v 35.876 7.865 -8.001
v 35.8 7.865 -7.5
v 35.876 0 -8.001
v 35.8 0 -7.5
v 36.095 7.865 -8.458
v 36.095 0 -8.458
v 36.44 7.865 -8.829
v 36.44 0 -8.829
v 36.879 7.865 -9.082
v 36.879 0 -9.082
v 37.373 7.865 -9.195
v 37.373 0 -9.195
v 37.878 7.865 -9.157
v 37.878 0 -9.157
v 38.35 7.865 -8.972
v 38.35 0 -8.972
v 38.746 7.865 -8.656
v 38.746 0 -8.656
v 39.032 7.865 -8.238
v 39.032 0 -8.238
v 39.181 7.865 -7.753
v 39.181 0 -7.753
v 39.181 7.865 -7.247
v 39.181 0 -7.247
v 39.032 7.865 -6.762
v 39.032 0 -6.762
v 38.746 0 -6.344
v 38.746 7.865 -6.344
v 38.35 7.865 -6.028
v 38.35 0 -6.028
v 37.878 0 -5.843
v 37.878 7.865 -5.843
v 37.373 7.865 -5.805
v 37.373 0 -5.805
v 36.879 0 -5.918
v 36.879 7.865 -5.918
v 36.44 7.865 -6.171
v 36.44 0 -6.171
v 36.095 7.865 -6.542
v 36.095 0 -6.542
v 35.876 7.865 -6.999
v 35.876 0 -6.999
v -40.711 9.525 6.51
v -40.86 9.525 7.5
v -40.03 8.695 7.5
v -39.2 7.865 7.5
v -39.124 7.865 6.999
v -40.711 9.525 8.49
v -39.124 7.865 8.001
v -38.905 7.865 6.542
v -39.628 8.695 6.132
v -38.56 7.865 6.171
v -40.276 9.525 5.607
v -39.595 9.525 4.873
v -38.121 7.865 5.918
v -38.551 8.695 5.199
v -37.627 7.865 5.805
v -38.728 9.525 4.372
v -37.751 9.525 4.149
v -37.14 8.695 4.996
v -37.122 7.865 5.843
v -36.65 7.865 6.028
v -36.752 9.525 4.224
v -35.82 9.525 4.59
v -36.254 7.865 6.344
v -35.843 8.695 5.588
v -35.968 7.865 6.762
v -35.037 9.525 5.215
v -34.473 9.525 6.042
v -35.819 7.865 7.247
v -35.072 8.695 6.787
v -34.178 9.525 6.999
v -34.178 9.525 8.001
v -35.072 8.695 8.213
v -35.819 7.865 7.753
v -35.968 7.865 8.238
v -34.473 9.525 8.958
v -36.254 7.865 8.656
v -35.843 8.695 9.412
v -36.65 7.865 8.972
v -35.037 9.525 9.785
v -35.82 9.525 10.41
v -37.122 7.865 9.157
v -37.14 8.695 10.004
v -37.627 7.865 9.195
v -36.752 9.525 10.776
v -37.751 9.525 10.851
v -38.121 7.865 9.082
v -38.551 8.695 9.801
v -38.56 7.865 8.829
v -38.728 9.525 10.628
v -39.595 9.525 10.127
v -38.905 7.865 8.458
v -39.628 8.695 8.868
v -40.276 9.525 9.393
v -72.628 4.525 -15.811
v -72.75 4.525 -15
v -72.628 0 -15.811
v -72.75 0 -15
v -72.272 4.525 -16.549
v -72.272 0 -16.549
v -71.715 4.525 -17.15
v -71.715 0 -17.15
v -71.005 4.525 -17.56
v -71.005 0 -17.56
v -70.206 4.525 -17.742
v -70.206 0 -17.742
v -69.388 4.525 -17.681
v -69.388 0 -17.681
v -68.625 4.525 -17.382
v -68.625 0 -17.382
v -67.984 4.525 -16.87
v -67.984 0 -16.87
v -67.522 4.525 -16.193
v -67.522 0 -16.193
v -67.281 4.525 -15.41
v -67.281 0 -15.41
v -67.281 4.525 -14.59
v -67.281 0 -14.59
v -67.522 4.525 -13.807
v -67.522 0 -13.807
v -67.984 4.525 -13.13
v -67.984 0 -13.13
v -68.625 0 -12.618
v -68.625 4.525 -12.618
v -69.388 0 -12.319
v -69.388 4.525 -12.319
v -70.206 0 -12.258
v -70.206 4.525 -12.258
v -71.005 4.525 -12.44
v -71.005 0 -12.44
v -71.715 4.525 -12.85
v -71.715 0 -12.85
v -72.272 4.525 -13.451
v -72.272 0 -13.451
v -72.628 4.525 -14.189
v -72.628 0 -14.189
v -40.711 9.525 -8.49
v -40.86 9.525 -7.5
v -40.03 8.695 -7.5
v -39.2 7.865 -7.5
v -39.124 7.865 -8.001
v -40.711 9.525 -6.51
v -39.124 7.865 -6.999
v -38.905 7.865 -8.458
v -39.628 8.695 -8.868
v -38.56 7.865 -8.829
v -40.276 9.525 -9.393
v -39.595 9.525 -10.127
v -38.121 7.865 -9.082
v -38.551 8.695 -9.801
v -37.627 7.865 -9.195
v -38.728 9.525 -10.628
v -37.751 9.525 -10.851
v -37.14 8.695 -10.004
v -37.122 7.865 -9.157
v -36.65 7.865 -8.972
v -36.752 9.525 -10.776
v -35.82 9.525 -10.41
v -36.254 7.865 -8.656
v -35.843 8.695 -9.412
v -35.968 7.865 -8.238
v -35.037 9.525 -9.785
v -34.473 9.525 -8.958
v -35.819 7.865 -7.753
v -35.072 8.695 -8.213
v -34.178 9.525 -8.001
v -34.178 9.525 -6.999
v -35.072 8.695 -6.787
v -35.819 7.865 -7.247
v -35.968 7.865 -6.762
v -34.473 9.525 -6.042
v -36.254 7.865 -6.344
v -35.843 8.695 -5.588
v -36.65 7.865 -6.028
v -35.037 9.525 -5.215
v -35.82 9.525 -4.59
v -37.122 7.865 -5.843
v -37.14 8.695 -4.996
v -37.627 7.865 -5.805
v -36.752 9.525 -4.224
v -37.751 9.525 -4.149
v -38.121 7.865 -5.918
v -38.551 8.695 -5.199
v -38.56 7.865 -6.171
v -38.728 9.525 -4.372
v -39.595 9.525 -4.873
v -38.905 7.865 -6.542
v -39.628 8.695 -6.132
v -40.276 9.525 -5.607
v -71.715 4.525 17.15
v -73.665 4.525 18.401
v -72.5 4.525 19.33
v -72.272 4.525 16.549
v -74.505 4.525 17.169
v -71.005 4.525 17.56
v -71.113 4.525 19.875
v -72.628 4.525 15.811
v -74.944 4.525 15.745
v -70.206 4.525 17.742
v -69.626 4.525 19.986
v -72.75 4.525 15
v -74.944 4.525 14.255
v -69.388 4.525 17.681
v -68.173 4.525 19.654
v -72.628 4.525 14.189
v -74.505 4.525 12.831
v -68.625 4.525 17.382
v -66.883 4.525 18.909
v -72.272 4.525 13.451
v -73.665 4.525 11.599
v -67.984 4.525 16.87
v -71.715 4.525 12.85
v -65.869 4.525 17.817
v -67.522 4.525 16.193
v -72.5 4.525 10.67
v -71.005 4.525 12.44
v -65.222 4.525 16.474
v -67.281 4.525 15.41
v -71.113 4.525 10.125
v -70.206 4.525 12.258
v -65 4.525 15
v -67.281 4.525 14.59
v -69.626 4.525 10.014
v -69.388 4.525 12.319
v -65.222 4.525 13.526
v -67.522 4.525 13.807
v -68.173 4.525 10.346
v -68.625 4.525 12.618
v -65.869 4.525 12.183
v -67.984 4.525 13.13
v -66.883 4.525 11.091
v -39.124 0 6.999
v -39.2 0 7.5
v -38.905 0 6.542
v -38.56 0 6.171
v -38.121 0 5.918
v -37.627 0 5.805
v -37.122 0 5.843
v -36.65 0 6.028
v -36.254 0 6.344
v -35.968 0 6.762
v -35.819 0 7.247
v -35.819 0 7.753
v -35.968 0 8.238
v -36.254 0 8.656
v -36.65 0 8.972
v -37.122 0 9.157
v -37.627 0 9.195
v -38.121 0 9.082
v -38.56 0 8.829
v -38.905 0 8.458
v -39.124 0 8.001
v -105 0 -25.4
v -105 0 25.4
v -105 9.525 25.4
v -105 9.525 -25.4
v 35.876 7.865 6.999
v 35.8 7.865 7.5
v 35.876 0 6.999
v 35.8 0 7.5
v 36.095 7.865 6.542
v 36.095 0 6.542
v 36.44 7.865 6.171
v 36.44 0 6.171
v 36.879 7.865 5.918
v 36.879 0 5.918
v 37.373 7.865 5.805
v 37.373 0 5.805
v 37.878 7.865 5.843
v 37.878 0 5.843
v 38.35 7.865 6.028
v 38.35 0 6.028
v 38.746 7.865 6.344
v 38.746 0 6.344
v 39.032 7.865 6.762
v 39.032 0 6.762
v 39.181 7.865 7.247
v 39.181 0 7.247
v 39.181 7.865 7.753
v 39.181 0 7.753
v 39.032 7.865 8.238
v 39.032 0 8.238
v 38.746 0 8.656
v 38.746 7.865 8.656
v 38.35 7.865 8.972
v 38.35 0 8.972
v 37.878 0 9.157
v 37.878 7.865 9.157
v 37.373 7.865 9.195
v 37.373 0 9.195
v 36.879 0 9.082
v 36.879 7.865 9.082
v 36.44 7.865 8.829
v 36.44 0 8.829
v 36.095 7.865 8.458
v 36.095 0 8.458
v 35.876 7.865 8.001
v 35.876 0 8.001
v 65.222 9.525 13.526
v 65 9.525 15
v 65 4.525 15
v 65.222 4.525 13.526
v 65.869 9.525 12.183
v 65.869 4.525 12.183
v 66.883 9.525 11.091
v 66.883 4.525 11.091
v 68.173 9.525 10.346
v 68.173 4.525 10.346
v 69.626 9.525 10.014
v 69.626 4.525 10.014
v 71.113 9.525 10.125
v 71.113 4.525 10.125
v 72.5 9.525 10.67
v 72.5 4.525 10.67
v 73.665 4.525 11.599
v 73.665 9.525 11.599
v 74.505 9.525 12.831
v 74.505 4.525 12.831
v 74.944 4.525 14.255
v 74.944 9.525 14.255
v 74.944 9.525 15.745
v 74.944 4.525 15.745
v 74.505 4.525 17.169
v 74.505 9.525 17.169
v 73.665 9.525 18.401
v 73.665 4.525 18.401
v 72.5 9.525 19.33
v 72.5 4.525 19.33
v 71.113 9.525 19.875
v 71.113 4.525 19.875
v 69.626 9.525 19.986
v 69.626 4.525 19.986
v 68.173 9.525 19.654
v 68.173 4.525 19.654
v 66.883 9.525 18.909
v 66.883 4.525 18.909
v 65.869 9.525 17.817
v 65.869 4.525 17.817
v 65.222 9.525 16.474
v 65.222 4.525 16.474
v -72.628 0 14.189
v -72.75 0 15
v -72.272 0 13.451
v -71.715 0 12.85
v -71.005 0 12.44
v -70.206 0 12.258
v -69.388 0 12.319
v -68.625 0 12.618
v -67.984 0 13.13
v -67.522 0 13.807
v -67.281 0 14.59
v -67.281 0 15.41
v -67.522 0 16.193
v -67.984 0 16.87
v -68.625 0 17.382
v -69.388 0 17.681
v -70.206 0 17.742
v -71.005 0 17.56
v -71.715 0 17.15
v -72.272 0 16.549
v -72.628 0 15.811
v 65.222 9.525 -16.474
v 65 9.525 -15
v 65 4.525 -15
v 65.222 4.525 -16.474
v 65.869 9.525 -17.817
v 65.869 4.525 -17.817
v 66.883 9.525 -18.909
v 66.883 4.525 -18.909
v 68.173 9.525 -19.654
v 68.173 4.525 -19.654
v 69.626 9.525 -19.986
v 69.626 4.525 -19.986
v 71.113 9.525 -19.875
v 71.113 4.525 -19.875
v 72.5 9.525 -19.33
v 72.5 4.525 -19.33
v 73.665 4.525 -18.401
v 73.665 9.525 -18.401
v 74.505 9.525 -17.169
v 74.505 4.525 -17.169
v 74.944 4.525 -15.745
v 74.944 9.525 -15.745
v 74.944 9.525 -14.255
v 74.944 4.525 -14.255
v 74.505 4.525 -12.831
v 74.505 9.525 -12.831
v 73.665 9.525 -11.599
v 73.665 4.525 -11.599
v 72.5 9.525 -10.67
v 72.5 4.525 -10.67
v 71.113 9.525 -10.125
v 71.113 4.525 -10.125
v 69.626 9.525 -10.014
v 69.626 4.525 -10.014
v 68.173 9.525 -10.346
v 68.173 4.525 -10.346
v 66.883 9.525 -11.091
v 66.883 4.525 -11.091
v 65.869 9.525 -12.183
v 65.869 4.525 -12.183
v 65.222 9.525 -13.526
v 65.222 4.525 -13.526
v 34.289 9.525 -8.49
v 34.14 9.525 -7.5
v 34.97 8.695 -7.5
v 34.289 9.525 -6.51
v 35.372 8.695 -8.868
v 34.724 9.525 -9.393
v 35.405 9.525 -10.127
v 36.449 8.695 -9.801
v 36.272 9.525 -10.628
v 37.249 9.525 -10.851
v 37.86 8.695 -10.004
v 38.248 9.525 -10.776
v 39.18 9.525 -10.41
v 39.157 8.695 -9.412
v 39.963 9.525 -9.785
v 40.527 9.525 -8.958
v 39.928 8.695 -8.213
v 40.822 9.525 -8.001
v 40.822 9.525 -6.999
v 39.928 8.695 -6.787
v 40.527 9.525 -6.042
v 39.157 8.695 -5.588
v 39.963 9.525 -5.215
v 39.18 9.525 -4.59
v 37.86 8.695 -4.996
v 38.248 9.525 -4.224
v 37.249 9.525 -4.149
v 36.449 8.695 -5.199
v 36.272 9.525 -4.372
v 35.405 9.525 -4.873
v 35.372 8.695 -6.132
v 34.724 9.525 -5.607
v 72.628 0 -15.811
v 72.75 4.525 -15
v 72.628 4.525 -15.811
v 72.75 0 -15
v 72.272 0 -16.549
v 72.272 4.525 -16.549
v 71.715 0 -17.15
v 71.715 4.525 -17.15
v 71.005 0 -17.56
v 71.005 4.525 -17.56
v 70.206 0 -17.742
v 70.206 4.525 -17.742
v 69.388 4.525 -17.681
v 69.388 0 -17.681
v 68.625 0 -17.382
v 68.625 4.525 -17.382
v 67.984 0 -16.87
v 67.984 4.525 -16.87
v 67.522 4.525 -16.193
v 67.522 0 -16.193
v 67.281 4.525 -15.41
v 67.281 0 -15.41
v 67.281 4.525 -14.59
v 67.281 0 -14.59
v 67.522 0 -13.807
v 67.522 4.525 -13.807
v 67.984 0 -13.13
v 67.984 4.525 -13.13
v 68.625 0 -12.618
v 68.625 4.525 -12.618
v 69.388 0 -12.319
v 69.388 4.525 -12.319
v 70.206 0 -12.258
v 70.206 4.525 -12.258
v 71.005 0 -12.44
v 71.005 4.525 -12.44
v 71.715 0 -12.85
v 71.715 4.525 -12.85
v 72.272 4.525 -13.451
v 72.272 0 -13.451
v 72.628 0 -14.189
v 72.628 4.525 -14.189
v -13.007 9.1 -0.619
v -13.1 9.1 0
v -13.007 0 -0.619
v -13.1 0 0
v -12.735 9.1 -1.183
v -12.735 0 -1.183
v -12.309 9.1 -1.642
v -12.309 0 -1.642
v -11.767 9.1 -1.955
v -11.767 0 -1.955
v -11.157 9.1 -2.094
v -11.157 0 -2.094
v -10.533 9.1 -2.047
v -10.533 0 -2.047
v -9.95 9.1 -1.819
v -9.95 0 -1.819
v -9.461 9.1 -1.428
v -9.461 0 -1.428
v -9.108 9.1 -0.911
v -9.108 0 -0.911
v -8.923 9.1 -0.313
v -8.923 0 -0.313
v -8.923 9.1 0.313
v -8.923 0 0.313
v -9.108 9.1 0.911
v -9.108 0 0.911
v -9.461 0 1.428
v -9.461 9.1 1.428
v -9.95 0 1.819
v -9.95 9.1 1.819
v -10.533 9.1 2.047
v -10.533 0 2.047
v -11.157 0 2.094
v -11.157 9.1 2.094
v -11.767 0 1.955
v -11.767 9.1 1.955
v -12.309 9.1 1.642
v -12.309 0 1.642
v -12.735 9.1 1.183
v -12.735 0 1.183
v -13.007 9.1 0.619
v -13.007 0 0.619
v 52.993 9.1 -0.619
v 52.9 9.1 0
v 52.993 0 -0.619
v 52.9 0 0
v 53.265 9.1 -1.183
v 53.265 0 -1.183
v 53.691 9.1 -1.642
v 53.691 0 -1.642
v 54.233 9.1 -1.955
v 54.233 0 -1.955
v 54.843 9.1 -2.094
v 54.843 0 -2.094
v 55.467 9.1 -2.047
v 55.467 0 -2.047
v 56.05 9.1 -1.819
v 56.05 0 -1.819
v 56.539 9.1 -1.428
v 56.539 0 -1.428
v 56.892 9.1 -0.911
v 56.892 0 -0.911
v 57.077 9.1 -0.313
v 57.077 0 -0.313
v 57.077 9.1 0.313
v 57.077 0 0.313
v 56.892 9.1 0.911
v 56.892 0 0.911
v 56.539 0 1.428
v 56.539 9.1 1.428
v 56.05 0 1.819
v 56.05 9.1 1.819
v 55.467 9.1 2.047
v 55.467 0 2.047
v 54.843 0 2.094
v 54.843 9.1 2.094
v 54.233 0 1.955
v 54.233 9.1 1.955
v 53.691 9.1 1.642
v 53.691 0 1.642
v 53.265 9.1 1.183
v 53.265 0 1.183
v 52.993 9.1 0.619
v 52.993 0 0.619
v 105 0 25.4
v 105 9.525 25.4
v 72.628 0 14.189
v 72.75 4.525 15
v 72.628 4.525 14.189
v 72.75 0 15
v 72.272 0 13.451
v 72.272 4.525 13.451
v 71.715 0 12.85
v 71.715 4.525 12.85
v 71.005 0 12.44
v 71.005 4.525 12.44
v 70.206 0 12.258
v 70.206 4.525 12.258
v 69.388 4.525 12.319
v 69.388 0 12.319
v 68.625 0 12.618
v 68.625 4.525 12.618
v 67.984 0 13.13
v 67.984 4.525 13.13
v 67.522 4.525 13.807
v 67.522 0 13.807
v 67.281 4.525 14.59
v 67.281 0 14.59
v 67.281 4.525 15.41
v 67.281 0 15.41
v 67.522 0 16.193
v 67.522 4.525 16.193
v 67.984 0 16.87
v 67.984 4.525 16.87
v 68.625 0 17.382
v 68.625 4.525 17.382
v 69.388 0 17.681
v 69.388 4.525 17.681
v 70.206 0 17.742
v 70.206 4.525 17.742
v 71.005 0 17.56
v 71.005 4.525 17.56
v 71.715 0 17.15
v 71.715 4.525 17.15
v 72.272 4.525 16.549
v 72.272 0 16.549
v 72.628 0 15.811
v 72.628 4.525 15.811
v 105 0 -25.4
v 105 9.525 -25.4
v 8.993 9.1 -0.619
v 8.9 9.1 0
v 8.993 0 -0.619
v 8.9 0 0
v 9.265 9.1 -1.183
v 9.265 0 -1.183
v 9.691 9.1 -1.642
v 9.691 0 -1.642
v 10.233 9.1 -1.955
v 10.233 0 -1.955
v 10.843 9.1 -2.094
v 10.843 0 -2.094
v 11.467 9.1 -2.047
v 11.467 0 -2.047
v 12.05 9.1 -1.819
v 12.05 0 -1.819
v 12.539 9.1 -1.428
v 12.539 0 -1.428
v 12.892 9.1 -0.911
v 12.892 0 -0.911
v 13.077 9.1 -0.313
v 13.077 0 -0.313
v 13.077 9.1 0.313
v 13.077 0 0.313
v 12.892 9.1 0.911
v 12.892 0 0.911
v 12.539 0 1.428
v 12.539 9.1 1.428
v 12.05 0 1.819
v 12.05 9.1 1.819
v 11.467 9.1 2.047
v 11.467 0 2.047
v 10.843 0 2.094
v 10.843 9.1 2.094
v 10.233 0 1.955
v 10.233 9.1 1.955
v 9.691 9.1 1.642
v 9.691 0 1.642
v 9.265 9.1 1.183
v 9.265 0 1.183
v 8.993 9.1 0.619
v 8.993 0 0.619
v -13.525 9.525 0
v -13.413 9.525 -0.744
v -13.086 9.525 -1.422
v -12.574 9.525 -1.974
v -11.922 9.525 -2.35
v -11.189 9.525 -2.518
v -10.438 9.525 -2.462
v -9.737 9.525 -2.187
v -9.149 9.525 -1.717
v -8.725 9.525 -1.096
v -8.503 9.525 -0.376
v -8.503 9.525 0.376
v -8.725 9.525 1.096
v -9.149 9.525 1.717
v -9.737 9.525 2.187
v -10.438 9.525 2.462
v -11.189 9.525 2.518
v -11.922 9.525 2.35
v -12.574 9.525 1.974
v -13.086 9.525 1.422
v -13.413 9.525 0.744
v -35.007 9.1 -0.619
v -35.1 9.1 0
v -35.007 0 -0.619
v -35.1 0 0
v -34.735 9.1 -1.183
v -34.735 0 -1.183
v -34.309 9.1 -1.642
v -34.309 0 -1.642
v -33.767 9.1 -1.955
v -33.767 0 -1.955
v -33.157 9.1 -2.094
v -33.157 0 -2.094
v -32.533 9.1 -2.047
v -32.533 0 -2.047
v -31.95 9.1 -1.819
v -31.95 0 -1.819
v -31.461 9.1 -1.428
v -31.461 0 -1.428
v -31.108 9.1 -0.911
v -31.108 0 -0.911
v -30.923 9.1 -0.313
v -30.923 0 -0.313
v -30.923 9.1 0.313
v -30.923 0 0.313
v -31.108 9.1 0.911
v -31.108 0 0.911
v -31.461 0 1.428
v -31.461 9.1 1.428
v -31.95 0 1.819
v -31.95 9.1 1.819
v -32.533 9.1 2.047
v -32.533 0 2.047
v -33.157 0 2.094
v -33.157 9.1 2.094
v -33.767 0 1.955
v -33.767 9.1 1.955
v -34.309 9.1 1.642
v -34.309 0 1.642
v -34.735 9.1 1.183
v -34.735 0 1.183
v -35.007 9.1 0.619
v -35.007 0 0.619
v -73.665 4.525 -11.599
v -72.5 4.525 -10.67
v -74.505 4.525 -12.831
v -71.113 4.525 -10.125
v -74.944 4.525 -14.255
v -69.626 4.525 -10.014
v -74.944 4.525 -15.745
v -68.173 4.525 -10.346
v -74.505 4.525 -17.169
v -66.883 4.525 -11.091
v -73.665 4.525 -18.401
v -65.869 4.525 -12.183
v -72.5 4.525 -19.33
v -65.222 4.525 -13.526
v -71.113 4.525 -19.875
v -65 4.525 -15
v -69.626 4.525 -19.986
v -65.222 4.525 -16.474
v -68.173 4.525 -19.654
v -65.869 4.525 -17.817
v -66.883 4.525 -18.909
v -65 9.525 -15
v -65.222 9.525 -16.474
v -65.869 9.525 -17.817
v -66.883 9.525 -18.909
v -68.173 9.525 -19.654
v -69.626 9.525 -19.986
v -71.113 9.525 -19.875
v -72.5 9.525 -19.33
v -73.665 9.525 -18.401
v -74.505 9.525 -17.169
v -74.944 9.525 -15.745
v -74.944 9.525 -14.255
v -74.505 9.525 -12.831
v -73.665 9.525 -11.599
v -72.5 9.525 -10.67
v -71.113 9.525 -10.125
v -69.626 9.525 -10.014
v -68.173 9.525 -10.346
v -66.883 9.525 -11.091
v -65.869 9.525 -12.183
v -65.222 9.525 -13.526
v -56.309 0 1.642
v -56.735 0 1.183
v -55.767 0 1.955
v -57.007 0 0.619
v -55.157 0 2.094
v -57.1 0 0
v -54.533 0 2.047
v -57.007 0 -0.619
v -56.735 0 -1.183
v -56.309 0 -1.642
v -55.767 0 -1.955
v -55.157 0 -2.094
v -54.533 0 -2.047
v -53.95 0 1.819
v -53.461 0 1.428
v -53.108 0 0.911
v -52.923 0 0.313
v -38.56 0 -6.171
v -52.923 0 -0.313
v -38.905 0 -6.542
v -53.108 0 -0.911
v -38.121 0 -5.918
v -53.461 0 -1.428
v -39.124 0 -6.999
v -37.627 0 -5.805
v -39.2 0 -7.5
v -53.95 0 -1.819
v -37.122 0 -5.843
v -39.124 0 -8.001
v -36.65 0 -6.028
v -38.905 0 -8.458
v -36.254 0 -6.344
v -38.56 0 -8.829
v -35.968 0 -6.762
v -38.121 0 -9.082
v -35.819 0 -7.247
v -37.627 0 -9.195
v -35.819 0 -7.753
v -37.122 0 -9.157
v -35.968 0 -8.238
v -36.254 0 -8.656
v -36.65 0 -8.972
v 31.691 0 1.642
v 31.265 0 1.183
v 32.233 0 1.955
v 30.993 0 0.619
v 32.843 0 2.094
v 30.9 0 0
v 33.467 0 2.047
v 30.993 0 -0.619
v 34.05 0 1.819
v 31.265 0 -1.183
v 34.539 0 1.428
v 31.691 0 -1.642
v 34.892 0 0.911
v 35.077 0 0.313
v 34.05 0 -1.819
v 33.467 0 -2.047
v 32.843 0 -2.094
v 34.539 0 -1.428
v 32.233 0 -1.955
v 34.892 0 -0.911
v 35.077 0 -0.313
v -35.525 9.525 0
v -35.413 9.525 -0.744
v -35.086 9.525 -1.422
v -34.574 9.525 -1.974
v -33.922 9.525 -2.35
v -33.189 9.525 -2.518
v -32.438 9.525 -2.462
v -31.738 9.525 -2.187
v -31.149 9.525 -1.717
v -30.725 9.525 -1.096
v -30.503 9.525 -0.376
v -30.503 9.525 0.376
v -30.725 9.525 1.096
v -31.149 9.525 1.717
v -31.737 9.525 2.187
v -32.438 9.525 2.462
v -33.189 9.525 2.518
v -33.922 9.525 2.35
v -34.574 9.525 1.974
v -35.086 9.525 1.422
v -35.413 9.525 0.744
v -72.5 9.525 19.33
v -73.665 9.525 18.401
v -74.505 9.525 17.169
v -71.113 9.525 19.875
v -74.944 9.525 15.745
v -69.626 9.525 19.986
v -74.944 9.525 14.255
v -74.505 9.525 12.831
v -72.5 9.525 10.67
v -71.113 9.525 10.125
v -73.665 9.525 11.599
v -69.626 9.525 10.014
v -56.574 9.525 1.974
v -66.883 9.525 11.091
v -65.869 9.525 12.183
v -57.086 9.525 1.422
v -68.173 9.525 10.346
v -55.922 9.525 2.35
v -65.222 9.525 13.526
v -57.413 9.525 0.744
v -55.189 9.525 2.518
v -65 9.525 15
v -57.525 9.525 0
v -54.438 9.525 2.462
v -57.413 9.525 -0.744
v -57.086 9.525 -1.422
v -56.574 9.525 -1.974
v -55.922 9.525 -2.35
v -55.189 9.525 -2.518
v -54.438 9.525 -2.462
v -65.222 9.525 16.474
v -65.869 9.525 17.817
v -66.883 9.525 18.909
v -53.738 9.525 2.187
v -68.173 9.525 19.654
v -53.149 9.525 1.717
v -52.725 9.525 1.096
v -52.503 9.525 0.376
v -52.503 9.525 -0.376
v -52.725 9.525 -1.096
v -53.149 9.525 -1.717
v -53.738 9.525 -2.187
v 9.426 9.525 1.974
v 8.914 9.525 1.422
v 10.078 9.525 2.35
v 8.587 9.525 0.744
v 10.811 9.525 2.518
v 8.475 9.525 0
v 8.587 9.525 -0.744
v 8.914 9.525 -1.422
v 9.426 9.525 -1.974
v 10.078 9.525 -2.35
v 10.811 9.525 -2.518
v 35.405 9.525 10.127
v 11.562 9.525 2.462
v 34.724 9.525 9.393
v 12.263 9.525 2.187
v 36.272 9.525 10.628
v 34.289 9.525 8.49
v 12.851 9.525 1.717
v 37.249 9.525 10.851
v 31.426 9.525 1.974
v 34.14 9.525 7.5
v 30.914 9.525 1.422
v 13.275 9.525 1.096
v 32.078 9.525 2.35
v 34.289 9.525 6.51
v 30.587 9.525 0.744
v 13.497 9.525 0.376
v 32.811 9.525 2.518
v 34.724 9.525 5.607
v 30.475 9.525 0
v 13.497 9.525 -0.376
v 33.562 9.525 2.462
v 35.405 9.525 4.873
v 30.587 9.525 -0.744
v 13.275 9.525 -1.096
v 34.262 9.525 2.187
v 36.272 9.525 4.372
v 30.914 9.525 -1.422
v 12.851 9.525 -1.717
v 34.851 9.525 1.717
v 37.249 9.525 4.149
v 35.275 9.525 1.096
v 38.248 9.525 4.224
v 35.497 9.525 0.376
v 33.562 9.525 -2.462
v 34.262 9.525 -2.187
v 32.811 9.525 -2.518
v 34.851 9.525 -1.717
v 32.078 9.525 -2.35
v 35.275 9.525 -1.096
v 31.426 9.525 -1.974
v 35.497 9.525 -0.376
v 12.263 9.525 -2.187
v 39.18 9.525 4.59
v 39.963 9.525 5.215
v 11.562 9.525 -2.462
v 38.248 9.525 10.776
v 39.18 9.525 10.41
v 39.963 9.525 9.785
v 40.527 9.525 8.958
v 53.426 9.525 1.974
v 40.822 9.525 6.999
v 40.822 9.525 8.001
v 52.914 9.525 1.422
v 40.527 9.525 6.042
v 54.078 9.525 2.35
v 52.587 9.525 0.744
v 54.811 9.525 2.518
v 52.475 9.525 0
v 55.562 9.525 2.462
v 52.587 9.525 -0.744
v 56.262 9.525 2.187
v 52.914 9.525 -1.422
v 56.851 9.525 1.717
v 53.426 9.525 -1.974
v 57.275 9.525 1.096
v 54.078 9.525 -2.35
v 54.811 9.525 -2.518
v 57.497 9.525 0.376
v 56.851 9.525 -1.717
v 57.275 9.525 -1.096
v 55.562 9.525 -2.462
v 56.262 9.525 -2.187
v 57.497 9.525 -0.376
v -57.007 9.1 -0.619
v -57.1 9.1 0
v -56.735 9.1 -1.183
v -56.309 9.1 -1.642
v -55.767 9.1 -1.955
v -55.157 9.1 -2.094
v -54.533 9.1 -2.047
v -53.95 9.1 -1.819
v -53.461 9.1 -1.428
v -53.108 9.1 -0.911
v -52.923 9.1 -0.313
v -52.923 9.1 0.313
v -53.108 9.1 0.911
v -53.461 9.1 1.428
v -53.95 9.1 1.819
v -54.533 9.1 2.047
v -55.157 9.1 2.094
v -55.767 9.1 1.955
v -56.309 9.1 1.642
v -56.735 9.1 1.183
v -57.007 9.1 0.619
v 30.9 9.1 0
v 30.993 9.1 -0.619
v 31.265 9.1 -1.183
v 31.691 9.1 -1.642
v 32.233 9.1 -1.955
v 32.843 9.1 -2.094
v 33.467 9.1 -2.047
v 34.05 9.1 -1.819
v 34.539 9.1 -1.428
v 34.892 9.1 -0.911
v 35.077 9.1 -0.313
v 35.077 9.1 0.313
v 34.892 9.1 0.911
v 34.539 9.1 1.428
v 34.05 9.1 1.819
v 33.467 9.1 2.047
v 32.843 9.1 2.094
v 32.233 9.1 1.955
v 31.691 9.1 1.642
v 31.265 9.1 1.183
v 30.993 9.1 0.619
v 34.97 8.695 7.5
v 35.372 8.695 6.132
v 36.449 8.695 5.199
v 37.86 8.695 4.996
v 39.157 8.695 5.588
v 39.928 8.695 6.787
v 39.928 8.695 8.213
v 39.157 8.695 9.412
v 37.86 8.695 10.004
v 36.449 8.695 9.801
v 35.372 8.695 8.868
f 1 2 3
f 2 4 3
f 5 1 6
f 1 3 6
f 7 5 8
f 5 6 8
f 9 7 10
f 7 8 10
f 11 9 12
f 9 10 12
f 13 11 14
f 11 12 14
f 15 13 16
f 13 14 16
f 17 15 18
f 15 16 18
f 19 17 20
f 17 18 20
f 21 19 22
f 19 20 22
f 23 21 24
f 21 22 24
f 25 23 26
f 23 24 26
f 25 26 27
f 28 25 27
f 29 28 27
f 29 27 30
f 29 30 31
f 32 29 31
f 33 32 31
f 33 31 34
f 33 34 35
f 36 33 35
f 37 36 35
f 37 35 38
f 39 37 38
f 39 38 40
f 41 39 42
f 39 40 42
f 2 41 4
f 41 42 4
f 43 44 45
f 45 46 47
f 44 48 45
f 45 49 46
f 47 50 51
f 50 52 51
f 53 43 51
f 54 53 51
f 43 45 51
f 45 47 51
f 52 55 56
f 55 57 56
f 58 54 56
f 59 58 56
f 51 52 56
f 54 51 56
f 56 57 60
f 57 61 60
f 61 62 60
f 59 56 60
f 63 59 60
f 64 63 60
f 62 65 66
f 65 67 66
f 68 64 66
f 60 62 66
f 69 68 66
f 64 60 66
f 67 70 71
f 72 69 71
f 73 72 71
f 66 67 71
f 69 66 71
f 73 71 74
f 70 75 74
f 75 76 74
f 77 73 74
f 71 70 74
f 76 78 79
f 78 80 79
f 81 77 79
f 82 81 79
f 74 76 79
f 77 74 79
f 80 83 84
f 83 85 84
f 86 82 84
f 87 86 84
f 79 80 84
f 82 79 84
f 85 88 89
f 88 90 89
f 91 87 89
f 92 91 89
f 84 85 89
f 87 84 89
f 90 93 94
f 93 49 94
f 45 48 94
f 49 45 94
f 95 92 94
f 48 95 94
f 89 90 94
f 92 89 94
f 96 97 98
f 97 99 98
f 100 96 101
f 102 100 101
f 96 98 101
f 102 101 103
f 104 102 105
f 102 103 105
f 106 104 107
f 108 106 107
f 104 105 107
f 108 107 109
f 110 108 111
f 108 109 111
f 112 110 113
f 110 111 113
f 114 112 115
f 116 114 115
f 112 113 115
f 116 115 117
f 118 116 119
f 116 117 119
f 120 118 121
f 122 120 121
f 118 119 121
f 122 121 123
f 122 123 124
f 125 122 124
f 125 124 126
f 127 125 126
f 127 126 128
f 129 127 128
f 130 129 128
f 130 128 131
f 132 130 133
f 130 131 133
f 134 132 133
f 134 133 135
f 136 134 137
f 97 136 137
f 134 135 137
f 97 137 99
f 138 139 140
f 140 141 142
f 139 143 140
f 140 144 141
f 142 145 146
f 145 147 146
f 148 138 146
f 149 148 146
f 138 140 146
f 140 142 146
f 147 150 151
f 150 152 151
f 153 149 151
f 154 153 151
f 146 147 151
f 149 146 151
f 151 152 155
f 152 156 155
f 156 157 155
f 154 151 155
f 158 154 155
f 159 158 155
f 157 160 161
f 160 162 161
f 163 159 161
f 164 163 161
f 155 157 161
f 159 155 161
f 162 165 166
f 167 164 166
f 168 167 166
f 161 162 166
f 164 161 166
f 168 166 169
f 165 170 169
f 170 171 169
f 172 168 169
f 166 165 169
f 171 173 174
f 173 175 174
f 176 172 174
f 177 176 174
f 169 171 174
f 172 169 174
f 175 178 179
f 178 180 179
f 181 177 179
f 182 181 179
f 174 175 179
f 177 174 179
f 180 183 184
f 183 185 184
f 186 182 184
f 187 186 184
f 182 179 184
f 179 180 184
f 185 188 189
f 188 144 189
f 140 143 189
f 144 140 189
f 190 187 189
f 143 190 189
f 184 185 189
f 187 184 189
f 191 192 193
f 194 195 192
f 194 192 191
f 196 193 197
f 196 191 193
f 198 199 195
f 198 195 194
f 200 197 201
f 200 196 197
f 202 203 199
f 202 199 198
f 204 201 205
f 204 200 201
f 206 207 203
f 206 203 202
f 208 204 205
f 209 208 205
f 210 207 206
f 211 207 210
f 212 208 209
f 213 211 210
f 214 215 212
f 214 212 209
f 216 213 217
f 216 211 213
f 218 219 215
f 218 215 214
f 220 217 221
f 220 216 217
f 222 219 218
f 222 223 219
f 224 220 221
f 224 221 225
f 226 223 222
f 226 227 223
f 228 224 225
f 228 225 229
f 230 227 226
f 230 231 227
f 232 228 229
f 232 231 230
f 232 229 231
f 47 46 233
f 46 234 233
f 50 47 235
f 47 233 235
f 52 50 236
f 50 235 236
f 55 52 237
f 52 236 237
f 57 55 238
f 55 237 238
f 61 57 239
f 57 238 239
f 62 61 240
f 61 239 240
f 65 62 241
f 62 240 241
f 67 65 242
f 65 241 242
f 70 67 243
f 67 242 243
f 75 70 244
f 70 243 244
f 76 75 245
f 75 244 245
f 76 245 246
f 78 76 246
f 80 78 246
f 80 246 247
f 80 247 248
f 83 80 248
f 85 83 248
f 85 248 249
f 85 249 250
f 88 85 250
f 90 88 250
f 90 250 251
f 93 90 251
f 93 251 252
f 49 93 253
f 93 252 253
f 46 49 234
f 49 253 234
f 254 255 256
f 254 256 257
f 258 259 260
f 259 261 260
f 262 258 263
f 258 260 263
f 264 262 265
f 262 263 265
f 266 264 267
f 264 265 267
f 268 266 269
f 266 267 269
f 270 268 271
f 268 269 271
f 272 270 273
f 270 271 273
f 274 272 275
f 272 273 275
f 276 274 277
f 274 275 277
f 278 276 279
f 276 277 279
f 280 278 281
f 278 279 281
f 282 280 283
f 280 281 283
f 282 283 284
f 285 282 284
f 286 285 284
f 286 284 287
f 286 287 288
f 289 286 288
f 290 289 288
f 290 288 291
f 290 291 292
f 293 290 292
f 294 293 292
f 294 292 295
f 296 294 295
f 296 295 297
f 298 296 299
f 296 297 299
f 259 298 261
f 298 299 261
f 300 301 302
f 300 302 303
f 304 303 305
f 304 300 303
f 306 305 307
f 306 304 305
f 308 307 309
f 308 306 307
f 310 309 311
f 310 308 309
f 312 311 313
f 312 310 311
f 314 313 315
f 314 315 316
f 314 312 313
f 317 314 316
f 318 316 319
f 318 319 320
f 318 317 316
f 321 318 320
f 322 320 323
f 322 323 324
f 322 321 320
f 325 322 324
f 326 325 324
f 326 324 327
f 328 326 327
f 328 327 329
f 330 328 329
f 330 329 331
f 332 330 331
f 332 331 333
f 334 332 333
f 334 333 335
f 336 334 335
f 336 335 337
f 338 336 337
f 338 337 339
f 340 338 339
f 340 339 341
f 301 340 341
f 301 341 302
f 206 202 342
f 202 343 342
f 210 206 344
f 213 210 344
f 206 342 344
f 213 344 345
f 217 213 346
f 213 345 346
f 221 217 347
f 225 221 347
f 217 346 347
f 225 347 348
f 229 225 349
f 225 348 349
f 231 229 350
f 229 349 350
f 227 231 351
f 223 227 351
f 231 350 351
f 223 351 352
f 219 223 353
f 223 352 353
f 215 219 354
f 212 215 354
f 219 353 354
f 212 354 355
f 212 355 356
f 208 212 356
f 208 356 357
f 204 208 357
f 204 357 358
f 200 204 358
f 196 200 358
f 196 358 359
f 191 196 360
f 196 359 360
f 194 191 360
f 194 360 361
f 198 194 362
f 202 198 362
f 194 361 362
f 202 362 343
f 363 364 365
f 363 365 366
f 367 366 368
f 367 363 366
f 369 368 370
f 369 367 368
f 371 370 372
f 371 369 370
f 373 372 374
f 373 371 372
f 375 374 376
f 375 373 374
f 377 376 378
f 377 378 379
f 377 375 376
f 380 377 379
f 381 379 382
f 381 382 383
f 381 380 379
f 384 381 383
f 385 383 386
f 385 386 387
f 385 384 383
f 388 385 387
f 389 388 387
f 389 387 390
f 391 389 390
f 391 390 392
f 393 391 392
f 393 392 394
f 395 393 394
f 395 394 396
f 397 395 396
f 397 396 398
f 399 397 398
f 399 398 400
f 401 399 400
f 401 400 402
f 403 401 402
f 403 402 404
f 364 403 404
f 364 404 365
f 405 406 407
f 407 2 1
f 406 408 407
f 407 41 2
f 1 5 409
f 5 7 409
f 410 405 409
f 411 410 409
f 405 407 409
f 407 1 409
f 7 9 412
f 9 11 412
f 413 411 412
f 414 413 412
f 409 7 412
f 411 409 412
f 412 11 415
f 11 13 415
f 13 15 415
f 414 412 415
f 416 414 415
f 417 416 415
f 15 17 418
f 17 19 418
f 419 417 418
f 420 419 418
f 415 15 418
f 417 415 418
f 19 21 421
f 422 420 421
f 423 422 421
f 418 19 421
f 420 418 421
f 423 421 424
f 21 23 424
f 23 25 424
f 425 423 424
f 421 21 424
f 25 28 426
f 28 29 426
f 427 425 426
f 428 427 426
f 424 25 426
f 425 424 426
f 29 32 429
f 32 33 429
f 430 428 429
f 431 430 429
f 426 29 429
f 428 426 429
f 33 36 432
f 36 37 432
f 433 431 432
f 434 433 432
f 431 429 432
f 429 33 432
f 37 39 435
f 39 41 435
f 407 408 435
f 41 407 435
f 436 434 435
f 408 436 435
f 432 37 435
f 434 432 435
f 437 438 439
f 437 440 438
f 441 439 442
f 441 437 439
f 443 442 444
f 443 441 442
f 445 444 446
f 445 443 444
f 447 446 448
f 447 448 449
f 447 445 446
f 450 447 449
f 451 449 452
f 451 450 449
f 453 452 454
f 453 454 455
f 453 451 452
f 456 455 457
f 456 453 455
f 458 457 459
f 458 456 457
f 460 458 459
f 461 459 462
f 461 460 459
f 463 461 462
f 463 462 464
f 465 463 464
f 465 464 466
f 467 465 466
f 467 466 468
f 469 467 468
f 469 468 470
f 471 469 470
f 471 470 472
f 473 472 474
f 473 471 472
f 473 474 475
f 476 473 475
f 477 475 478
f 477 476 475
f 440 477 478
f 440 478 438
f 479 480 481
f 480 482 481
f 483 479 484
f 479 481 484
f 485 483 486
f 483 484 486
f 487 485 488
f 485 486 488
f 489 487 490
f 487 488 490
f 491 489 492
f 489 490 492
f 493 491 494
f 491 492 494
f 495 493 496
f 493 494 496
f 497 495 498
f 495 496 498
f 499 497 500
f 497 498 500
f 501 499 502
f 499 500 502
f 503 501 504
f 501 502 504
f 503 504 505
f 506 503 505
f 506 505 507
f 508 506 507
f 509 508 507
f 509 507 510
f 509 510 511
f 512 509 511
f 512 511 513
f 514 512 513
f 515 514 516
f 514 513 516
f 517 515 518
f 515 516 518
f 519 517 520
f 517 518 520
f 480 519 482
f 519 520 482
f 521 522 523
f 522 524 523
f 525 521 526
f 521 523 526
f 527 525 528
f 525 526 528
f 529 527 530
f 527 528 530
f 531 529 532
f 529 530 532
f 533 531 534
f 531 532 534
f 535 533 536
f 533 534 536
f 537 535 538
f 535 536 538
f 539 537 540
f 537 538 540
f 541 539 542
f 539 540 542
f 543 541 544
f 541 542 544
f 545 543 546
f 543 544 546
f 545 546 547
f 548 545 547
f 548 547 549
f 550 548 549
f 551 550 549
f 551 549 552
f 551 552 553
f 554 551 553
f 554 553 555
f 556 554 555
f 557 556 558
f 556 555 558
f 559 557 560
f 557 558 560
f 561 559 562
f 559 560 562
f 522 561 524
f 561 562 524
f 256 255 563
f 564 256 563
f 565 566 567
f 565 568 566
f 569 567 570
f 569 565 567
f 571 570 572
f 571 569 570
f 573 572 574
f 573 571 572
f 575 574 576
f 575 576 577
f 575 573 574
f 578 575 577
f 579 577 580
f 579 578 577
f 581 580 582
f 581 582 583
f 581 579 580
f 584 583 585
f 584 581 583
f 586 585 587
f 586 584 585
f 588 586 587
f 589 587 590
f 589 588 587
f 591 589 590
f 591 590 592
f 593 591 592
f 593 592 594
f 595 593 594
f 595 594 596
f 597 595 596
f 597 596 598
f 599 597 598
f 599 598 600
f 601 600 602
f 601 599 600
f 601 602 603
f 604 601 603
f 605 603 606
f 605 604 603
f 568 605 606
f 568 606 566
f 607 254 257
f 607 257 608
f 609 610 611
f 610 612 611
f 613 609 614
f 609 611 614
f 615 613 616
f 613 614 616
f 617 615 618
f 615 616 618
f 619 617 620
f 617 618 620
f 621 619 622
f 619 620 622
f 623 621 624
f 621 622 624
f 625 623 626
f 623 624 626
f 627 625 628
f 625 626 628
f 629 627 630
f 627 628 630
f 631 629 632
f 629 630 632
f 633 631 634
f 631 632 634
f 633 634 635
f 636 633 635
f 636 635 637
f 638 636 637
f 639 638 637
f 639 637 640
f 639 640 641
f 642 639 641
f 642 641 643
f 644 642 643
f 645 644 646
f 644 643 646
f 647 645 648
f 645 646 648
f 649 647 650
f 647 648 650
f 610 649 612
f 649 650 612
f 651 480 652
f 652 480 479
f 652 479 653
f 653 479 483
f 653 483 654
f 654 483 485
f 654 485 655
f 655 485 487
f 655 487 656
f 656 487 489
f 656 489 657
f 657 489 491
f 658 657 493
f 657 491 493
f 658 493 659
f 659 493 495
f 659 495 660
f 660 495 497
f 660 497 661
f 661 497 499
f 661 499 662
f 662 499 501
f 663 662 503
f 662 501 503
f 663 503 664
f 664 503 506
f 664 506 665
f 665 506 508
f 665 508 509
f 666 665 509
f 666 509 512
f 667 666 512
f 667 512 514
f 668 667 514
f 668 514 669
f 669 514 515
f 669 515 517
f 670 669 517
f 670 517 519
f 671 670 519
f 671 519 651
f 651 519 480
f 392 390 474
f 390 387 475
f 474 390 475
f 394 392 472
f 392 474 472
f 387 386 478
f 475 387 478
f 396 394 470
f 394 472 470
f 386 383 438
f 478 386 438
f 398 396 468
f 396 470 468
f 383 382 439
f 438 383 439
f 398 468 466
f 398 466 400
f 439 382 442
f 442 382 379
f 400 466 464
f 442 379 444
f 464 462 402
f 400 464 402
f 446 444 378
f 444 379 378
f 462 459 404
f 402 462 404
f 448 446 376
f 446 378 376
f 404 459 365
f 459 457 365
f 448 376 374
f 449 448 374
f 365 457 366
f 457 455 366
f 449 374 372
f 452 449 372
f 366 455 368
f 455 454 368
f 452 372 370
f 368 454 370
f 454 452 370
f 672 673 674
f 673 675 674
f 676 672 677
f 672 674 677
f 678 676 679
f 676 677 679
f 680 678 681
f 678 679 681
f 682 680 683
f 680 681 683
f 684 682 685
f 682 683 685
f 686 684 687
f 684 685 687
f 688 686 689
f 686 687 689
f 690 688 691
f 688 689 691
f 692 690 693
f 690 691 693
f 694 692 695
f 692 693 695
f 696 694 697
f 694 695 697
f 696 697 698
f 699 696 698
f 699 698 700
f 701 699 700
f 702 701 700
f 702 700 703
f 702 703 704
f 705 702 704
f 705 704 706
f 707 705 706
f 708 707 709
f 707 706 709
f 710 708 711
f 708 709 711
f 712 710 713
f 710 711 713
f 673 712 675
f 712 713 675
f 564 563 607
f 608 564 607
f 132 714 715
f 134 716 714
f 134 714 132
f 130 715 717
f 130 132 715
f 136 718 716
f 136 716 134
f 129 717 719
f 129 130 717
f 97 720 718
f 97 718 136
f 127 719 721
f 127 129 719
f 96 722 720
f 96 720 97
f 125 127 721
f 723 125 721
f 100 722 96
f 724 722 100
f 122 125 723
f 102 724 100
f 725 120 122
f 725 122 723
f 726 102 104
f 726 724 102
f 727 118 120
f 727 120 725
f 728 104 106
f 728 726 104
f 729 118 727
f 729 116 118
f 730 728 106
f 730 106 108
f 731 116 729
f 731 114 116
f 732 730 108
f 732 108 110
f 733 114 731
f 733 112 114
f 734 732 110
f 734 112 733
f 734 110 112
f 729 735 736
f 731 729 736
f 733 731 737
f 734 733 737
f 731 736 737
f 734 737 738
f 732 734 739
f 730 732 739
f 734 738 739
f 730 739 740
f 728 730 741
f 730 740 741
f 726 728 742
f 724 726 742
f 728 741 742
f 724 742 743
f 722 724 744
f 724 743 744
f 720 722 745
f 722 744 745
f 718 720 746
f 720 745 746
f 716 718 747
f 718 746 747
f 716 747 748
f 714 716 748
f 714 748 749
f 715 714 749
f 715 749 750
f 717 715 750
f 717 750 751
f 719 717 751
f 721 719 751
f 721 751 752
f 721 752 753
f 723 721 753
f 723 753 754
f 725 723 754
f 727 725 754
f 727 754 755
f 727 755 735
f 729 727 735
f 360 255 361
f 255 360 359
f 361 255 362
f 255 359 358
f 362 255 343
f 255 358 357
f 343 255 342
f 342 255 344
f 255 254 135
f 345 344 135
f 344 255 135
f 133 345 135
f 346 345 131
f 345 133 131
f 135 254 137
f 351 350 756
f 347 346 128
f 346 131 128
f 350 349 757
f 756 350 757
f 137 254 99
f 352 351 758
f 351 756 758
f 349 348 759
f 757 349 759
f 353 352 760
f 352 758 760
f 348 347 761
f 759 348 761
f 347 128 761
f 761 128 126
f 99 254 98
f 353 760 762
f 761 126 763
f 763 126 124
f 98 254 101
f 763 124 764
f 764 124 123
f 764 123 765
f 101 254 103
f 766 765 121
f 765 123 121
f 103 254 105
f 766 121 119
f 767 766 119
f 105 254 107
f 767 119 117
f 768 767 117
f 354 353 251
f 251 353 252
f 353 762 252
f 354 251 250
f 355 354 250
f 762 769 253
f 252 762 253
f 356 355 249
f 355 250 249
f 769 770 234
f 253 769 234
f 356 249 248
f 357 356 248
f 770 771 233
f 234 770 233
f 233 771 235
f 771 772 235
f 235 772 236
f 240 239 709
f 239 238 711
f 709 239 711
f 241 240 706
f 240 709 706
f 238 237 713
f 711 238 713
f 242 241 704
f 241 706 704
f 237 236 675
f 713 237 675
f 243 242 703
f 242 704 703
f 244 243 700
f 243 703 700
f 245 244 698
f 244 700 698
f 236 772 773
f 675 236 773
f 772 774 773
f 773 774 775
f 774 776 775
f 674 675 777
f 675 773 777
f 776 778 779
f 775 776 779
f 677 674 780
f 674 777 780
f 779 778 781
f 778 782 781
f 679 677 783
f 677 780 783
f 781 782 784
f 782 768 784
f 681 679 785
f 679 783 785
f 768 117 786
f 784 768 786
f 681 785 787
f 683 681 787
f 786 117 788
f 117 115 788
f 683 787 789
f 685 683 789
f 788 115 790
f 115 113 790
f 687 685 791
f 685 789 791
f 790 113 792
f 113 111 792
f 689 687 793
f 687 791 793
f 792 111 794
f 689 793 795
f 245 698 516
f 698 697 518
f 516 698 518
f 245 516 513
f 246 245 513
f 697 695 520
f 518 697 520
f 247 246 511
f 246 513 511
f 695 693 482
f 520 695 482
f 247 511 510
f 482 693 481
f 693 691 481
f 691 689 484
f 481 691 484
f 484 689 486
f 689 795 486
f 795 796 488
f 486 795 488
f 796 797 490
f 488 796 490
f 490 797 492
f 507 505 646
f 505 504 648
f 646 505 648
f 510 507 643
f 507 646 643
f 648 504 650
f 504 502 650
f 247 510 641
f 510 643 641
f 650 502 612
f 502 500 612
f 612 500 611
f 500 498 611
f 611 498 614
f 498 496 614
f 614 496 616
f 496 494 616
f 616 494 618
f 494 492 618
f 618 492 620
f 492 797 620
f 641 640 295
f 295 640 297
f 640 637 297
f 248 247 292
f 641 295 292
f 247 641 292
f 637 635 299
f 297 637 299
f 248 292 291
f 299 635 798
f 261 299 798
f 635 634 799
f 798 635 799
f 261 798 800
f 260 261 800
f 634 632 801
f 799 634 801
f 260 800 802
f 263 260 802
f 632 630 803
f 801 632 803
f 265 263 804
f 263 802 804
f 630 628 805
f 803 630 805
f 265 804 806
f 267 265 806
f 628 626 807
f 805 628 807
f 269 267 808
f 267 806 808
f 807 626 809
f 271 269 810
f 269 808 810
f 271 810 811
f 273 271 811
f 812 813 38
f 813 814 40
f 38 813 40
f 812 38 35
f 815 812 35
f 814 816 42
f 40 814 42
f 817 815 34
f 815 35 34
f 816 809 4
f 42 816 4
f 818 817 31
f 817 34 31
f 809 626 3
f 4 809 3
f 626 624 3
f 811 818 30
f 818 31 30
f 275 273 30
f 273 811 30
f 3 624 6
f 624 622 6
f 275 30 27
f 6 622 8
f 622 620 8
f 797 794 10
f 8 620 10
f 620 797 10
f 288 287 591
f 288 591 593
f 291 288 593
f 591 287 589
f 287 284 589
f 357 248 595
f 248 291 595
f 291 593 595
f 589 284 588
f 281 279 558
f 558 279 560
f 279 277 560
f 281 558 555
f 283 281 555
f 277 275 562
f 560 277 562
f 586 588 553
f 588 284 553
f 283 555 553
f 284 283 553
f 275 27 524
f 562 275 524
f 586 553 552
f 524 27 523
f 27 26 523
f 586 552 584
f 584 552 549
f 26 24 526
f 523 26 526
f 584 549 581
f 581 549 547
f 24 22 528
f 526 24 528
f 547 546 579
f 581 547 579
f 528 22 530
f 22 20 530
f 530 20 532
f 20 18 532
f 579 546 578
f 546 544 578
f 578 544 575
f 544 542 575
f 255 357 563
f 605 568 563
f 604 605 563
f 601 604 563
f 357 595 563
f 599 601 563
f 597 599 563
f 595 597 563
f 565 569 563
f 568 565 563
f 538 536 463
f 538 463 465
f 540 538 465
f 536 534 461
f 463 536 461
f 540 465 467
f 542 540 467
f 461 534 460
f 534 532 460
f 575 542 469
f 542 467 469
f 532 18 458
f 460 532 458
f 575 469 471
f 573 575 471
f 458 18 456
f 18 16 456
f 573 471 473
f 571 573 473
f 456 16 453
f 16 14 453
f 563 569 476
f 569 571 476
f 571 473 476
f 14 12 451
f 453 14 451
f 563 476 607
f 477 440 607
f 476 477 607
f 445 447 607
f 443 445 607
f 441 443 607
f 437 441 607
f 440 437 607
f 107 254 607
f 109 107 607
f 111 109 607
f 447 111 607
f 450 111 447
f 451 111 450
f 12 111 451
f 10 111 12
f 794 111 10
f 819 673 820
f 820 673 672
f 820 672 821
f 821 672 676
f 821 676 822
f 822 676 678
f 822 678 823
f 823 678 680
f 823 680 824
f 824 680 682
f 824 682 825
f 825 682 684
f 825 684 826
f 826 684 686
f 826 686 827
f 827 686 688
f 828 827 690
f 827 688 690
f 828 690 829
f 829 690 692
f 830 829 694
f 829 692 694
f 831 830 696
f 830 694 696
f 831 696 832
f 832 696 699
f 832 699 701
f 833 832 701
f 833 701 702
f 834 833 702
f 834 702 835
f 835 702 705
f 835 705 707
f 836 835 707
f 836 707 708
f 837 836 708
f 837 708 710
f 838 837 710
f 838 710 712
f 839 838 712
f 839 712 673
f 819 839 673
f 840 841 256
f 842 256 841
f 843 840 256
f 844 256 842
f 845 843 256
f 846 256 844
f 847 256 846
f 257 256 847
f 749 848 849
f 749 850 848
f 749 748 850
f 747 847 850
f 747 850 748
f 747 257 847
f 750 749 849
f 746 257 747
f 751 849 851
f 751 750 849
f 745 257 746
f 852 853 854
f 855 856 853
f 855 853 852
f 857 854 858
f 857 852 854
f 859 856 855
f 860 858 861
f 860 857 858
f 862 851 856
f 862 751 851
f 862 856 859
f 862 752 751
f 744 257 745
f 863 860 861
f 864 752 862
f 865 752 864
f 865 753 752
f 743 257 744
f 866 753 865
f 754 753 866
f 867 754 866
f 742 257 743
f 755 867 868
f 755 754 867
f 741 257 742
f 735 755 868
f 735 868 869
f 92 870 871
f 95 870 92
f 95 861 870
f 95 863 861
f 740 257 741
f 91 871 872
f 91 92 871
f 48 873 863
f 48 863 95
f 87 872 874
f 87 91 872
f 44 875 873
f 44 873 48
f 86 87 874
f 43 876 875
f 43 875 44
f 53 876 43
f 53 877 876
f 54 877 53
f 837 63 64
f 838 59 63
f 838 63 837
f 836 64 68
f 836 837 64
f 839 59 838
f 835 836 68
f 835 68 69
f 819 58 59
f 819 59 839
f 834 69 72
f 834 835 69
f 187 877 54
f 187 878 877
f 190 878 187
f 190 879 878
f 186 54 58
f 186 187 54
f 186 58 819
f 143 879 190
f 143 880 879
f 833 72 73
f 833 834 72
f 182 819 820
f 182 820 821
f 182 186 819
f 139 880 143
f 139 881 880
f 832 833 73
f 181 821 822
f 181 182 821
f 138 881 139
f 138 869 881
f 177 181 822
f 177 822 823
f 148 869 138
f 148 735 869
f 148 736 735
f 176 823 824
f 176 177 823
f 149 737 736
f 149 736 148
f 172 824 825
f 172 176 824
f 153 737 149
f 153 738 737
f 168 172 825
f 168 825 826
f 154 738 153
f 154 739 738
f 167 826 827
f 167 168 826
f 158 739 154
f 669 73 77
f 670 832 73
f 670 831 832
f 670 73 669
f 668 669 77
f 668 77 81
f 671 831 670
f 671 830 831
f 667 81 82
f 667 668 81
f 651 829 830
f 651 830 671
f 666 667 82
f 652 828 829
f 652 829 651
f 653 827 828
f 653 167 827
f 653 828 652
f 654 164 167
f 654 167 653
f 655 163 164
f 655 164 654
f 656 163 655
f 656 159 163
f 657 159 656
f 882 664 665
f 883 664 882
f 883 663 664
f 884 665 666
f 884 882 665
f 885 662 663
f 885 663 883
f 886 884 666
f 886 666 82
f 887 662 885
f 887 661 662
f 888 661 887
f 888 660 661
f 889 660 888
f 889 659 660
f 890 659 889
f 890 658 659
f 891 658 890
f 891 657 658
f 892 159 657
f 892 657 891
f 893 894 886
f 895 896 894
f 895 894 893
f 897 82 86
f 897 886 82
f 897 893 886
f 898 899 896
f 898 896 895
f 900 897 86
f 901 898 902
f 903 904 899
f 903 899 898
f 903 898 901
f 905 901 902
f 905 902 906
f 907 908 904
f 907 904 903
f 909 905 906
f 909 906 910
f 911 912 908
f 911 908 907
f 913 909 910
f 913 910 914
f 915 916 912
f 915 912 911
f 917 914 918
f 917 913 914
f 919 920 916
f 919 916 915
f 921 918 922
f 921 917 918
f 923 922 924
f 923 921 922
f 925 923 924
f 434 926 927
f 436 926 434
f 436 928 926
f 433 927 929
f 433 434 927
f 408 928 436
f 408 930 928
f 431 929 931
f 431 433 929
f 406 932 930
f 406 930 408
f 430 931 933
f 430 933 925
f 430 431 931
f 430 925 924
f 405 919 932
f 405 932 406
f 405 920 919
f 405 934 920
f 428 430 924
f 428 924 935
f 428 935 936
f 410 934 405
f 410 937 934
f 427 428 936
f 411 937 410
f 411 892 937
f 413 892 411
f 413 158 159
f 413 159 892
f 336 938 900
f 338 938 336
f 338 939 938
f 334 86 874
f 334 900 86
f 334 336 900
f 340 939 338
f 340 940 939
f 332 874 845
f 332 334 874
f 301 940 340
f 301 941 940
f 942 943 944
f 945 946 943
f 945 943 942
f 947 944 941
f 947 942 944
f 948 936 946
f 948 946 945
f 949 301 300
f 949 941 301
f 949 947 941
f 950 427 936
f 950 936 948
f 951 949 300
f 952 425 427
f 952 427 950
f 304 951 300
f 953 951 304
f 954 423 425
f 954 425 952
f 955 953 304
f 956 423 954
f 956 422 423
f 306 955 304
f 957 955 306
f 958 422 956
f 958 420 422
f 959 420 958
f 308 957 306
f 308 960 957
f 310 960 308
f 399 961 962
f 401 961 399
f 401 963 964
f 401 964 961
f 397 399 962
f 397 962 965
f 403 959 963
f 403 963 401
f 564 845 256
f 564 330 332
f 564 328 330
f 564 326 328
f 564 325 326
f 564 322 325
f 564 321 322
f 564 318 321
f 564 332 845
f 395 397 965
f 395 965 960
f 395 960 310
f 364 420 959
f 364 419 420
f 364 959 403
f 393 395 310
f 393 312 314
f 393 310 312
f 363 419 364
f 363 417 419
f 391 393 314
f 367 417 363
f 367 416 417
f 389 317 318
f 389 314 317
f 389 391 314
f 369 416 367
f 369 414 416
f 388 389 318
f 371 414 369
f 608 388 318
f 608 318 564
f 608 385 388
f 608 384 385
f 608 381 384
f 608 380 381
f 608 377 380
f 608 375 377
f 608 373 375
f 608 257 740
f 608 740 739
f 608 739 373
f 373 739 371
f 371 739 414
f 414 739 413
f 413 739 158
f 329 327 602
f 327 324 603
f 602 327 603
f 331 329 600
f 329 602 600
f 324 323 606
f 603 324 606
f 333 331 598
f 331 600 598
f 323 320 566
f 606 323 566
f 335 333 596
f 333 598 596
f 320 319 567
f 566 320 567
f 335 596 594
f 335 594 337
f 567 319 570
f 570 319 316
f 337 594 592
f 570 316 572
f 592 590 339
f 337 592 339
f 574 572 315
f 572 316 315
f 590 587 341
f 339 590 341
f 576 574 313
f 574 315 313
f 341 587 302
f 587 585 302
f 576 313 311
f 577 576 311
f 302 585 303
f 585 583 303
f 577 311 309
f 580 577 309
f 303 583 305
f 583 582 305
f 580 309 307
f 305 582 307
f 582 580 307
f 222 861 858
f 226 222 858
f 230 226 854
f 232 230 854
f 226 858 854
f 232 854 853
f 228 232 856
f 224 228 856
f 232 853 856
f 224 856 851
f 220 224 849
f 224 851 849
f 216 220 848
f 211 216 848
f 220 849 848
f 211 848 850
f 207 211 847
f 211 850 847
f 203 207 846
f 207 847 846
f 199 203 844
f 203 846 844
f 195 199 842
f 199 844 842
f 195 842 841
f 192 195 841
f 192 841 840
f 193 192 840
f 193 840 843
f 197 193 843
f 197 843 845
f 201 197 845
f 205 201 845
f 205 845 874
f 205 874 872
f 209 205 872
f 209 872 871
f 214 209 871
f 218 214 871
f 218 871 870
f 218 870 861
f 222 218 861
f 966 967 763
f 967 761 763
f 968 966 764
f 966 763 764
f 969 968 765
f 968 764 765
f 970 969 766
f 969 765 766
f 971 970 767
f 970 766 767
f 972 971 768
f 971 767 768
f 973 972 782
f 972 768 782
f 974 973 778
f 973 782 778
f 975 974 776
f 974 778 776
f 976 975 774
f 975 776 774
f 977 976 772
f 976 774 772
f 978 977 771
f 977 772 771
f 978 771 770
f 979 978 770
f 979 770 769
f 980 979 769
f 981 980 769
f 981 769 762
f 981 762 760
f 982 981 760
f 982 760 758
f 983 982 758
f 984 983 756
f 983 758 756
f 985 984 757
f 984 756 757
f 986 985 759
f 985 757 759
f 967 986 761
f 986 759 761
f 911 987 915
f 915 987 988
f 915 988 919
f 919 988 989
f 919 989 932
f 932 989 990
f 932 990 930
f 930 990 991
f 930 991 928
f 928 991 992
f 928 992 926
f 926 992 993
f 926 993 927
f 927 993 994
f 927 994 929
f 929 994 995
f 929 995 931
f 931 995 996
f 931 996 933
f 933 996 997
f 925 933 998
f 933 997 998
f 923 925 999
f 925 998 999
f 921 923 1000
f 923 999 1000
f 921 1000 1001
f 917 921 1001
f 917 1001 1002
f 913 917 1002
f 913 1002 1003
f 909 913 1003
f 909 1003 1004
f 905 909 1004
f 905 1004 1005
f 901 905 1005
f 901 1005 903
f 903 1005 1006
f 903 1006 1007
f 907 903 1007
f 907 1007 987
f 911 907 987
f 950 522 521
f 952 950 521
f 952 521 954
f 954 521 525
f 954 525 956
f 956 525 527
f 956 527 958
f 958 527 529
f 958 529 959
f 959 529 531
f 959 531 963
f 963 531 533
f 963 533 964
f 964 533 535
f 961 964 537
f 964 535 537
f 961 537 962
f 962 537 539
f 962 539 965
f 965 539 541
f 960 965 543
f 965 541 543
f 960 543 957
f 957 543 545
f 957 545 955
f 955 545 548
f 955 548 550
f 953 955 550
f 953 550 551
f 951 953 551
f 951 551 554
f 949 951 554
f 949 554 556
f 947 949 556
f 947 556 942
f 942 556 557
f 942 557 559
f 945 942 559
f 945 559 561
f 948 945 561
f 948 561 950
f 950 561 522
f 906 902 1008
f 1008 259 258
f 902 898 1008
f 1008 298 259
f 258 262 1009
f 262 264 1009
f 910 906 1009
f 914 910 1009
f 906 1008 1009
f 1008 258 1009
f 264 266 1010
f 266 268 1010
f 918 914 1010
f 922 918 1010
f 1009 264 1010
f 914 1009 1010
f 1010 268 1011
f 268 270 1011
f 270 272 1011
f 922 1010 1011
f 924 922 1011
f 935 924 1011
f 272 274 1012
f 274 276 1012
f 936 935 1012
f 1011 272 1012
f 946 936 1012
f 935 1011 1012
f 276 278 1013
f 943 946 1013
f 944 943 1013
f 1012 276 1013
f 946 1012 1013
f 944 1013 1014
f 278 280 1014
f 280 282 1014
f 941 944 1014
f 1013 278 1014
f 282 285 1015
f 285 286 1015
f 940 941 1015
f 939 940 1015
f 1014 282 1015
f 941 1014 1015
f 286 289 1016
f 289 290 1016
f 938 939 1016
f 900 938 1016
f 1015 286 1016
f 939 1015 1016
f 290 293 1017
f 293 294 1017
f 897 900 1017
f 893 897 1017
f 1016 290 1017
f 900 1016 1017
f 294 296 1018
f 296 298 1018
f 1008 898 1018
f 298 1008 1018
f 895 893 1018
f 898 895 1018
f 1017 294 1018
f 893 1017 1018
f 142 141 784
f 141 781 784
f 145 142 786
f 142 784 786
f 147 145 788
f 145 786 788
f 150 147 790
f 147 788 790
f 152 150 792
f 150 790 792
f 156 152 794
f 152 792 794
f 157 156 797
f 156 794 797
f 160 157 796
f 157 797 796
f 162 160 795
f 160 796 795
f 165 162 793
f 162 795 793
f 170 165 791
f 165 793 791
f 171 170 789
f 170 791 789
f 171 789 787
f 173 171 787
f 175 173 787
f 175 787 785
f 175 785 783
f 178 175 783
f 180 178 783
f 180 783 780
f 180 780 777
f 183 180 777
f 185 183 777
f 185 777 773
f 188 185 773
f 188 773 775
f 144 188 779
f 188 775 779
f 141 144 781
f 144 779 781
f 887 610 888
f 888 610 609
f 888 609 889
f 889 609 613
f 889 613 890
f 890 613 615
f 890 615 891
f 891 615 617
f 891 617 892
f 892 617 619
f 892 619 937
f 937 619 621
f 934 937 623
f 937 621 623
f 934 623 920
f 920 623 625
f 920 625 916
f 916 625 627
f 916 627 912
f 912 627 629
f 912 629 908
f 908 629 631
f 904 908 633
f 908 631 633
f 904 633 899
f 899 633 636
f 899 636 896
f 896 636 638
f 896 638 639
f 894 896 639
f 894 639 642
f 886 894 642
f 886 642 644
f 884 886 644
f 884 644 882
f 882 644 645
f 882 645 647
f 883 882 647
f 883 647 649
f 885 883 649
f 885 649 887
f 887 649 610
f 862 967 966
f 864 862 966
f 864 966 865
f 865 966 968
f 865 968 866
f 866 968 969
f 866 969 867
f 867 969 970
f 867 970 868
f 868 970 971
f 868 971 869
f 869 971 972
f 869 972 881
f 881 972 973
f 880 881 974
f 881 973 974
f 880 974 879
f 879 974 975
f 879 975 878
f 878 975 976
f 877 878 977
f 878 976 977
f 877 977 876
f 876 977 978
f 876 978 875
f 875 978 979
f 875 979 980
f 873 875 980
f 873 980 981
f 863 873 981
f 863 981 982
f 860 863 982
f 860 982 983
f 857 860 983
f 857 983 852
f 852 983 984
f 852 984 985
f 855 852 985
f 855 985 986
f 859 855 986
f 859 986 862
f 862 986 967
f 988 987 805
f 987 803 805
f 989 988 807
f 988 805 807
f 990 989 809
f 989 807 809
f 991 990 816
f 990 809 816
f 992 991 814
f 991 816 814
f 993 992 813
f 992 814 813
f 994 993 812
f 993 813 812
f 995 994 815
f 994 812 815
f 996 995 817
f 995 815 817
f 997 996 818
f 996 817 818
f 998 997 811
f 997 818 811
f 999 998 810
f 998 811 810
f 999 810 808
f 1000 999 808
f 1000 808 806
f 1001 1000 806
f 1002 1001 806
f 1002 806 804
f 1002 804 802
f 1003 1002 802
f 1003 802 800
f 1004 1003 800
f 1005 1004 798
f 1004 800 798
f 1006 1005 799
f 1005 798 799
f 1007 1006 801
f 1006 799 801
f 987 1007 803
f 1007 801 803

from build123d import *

# Parameters (mm, degrees)
SKETCH1_W                       = 210
SKETCH1_H                       = 50.8
BOSS_EXTRUDE1_DEPTH             = 9.525
CSK_FOR_M3_SFHCS1_D             = 3.4
CSK_FOR_M3_SFHCS1_CSINK_D       = 6.72
CSK_FOR_M3_SFHCS1_CSINK_ANGLE   = 90
CBORE_FOR_M5_SHCS1_D            = 5.5
CBORE_FOR_M5_SHCS1_CBORE_D      = 10
CBORE_FOR_M5_SHCS1_CBORE_DEPTH  = 5
M5X0_8_TAPPED_HOLE1_D           = 4.2
M5X0_8_TAPPED_HOLE1_CSINK_D     = 5.05
M5X0_8_TAPPED_HOLE1_CSINK_ANGLE = 90


with BuildPart() as part:
    # Sketch1 → Boss-Extrude1 (new body)
    with BuildSketch(Plane(origin=(0, 0, 0), x_dir=(1, 0, 0), z_dir=(0, 1, 0))):
        Rectangle(SKETCH1_W, SKETCH1_H)
    extrude(amount=BOSS_EXTRUDE1_DEPTH)

    # CSK for M3 SFHCS1 (through all)
    with Locations(Plane(origin=(0, 9.525, 0), x_dir=(1, 0, 0), z_dir=(0, 1, 0))):
        with Locations((-37.5, 7.5), (-37.5, -7.5), (37.5, -7.5), (37.5, 7.5)):
            CounterSinkHole(CSK_FOR_M3_SFHCS1_D / 2, CSK_FOR_M3_SFHCS1_CSINK_D / 2, counter_sink_angle=CSK_FOR_M3_SFHCS1_CSINK_ANGLE)

    # CBORE for M5 SHCS1 (through all)
    with Locations(Plane(origin=(0, 9.525, 0), x_dir=(1, 0, 0), z_dir=(0, 1, 0))):
        with Locations((-70, -15), (-70, 15)):
            cbore_for_m5_shcs1 = CounterBoreHole(CBORE_FOR_M5_SHCS1_D / 2, CBORE_FOR_M5_SHCS1_CBORE_D / 2, CBORE_FOR_M5_SHCS1_CBORE_DEPTH)

    # Mirror1: CBORE for M5 SHCS1 across plane
    add(cbore_for_m5_shcs1.mirror(Plane(origin=(0, 0, 0), x_dir=(0, 0, 1), z_dir=(1, 0, 0))), mode=Mode.SUBTRACT)

    # M5x0.8 Tapped Hole1 (through all)
    with Locations(Plane(origin=(0, 9.525, 0), x_dir=(1, 0, 0), z_dir=(0, 1, 0))):
        with Locations((-55, 0), (-33, 0), (-11, 0), (11, 0), (33, 0), (55, 0)):
            CounterSinkHole(M5X0_8_TAPPED_HOLE1_D / 2, M5X0_8_TAPPED_HOLE1_CSINK_D / 2, counter_sink_angle=M5X0_8_TAPPED_HOLE1_CSINK_ANGLE)


solid = part.part
